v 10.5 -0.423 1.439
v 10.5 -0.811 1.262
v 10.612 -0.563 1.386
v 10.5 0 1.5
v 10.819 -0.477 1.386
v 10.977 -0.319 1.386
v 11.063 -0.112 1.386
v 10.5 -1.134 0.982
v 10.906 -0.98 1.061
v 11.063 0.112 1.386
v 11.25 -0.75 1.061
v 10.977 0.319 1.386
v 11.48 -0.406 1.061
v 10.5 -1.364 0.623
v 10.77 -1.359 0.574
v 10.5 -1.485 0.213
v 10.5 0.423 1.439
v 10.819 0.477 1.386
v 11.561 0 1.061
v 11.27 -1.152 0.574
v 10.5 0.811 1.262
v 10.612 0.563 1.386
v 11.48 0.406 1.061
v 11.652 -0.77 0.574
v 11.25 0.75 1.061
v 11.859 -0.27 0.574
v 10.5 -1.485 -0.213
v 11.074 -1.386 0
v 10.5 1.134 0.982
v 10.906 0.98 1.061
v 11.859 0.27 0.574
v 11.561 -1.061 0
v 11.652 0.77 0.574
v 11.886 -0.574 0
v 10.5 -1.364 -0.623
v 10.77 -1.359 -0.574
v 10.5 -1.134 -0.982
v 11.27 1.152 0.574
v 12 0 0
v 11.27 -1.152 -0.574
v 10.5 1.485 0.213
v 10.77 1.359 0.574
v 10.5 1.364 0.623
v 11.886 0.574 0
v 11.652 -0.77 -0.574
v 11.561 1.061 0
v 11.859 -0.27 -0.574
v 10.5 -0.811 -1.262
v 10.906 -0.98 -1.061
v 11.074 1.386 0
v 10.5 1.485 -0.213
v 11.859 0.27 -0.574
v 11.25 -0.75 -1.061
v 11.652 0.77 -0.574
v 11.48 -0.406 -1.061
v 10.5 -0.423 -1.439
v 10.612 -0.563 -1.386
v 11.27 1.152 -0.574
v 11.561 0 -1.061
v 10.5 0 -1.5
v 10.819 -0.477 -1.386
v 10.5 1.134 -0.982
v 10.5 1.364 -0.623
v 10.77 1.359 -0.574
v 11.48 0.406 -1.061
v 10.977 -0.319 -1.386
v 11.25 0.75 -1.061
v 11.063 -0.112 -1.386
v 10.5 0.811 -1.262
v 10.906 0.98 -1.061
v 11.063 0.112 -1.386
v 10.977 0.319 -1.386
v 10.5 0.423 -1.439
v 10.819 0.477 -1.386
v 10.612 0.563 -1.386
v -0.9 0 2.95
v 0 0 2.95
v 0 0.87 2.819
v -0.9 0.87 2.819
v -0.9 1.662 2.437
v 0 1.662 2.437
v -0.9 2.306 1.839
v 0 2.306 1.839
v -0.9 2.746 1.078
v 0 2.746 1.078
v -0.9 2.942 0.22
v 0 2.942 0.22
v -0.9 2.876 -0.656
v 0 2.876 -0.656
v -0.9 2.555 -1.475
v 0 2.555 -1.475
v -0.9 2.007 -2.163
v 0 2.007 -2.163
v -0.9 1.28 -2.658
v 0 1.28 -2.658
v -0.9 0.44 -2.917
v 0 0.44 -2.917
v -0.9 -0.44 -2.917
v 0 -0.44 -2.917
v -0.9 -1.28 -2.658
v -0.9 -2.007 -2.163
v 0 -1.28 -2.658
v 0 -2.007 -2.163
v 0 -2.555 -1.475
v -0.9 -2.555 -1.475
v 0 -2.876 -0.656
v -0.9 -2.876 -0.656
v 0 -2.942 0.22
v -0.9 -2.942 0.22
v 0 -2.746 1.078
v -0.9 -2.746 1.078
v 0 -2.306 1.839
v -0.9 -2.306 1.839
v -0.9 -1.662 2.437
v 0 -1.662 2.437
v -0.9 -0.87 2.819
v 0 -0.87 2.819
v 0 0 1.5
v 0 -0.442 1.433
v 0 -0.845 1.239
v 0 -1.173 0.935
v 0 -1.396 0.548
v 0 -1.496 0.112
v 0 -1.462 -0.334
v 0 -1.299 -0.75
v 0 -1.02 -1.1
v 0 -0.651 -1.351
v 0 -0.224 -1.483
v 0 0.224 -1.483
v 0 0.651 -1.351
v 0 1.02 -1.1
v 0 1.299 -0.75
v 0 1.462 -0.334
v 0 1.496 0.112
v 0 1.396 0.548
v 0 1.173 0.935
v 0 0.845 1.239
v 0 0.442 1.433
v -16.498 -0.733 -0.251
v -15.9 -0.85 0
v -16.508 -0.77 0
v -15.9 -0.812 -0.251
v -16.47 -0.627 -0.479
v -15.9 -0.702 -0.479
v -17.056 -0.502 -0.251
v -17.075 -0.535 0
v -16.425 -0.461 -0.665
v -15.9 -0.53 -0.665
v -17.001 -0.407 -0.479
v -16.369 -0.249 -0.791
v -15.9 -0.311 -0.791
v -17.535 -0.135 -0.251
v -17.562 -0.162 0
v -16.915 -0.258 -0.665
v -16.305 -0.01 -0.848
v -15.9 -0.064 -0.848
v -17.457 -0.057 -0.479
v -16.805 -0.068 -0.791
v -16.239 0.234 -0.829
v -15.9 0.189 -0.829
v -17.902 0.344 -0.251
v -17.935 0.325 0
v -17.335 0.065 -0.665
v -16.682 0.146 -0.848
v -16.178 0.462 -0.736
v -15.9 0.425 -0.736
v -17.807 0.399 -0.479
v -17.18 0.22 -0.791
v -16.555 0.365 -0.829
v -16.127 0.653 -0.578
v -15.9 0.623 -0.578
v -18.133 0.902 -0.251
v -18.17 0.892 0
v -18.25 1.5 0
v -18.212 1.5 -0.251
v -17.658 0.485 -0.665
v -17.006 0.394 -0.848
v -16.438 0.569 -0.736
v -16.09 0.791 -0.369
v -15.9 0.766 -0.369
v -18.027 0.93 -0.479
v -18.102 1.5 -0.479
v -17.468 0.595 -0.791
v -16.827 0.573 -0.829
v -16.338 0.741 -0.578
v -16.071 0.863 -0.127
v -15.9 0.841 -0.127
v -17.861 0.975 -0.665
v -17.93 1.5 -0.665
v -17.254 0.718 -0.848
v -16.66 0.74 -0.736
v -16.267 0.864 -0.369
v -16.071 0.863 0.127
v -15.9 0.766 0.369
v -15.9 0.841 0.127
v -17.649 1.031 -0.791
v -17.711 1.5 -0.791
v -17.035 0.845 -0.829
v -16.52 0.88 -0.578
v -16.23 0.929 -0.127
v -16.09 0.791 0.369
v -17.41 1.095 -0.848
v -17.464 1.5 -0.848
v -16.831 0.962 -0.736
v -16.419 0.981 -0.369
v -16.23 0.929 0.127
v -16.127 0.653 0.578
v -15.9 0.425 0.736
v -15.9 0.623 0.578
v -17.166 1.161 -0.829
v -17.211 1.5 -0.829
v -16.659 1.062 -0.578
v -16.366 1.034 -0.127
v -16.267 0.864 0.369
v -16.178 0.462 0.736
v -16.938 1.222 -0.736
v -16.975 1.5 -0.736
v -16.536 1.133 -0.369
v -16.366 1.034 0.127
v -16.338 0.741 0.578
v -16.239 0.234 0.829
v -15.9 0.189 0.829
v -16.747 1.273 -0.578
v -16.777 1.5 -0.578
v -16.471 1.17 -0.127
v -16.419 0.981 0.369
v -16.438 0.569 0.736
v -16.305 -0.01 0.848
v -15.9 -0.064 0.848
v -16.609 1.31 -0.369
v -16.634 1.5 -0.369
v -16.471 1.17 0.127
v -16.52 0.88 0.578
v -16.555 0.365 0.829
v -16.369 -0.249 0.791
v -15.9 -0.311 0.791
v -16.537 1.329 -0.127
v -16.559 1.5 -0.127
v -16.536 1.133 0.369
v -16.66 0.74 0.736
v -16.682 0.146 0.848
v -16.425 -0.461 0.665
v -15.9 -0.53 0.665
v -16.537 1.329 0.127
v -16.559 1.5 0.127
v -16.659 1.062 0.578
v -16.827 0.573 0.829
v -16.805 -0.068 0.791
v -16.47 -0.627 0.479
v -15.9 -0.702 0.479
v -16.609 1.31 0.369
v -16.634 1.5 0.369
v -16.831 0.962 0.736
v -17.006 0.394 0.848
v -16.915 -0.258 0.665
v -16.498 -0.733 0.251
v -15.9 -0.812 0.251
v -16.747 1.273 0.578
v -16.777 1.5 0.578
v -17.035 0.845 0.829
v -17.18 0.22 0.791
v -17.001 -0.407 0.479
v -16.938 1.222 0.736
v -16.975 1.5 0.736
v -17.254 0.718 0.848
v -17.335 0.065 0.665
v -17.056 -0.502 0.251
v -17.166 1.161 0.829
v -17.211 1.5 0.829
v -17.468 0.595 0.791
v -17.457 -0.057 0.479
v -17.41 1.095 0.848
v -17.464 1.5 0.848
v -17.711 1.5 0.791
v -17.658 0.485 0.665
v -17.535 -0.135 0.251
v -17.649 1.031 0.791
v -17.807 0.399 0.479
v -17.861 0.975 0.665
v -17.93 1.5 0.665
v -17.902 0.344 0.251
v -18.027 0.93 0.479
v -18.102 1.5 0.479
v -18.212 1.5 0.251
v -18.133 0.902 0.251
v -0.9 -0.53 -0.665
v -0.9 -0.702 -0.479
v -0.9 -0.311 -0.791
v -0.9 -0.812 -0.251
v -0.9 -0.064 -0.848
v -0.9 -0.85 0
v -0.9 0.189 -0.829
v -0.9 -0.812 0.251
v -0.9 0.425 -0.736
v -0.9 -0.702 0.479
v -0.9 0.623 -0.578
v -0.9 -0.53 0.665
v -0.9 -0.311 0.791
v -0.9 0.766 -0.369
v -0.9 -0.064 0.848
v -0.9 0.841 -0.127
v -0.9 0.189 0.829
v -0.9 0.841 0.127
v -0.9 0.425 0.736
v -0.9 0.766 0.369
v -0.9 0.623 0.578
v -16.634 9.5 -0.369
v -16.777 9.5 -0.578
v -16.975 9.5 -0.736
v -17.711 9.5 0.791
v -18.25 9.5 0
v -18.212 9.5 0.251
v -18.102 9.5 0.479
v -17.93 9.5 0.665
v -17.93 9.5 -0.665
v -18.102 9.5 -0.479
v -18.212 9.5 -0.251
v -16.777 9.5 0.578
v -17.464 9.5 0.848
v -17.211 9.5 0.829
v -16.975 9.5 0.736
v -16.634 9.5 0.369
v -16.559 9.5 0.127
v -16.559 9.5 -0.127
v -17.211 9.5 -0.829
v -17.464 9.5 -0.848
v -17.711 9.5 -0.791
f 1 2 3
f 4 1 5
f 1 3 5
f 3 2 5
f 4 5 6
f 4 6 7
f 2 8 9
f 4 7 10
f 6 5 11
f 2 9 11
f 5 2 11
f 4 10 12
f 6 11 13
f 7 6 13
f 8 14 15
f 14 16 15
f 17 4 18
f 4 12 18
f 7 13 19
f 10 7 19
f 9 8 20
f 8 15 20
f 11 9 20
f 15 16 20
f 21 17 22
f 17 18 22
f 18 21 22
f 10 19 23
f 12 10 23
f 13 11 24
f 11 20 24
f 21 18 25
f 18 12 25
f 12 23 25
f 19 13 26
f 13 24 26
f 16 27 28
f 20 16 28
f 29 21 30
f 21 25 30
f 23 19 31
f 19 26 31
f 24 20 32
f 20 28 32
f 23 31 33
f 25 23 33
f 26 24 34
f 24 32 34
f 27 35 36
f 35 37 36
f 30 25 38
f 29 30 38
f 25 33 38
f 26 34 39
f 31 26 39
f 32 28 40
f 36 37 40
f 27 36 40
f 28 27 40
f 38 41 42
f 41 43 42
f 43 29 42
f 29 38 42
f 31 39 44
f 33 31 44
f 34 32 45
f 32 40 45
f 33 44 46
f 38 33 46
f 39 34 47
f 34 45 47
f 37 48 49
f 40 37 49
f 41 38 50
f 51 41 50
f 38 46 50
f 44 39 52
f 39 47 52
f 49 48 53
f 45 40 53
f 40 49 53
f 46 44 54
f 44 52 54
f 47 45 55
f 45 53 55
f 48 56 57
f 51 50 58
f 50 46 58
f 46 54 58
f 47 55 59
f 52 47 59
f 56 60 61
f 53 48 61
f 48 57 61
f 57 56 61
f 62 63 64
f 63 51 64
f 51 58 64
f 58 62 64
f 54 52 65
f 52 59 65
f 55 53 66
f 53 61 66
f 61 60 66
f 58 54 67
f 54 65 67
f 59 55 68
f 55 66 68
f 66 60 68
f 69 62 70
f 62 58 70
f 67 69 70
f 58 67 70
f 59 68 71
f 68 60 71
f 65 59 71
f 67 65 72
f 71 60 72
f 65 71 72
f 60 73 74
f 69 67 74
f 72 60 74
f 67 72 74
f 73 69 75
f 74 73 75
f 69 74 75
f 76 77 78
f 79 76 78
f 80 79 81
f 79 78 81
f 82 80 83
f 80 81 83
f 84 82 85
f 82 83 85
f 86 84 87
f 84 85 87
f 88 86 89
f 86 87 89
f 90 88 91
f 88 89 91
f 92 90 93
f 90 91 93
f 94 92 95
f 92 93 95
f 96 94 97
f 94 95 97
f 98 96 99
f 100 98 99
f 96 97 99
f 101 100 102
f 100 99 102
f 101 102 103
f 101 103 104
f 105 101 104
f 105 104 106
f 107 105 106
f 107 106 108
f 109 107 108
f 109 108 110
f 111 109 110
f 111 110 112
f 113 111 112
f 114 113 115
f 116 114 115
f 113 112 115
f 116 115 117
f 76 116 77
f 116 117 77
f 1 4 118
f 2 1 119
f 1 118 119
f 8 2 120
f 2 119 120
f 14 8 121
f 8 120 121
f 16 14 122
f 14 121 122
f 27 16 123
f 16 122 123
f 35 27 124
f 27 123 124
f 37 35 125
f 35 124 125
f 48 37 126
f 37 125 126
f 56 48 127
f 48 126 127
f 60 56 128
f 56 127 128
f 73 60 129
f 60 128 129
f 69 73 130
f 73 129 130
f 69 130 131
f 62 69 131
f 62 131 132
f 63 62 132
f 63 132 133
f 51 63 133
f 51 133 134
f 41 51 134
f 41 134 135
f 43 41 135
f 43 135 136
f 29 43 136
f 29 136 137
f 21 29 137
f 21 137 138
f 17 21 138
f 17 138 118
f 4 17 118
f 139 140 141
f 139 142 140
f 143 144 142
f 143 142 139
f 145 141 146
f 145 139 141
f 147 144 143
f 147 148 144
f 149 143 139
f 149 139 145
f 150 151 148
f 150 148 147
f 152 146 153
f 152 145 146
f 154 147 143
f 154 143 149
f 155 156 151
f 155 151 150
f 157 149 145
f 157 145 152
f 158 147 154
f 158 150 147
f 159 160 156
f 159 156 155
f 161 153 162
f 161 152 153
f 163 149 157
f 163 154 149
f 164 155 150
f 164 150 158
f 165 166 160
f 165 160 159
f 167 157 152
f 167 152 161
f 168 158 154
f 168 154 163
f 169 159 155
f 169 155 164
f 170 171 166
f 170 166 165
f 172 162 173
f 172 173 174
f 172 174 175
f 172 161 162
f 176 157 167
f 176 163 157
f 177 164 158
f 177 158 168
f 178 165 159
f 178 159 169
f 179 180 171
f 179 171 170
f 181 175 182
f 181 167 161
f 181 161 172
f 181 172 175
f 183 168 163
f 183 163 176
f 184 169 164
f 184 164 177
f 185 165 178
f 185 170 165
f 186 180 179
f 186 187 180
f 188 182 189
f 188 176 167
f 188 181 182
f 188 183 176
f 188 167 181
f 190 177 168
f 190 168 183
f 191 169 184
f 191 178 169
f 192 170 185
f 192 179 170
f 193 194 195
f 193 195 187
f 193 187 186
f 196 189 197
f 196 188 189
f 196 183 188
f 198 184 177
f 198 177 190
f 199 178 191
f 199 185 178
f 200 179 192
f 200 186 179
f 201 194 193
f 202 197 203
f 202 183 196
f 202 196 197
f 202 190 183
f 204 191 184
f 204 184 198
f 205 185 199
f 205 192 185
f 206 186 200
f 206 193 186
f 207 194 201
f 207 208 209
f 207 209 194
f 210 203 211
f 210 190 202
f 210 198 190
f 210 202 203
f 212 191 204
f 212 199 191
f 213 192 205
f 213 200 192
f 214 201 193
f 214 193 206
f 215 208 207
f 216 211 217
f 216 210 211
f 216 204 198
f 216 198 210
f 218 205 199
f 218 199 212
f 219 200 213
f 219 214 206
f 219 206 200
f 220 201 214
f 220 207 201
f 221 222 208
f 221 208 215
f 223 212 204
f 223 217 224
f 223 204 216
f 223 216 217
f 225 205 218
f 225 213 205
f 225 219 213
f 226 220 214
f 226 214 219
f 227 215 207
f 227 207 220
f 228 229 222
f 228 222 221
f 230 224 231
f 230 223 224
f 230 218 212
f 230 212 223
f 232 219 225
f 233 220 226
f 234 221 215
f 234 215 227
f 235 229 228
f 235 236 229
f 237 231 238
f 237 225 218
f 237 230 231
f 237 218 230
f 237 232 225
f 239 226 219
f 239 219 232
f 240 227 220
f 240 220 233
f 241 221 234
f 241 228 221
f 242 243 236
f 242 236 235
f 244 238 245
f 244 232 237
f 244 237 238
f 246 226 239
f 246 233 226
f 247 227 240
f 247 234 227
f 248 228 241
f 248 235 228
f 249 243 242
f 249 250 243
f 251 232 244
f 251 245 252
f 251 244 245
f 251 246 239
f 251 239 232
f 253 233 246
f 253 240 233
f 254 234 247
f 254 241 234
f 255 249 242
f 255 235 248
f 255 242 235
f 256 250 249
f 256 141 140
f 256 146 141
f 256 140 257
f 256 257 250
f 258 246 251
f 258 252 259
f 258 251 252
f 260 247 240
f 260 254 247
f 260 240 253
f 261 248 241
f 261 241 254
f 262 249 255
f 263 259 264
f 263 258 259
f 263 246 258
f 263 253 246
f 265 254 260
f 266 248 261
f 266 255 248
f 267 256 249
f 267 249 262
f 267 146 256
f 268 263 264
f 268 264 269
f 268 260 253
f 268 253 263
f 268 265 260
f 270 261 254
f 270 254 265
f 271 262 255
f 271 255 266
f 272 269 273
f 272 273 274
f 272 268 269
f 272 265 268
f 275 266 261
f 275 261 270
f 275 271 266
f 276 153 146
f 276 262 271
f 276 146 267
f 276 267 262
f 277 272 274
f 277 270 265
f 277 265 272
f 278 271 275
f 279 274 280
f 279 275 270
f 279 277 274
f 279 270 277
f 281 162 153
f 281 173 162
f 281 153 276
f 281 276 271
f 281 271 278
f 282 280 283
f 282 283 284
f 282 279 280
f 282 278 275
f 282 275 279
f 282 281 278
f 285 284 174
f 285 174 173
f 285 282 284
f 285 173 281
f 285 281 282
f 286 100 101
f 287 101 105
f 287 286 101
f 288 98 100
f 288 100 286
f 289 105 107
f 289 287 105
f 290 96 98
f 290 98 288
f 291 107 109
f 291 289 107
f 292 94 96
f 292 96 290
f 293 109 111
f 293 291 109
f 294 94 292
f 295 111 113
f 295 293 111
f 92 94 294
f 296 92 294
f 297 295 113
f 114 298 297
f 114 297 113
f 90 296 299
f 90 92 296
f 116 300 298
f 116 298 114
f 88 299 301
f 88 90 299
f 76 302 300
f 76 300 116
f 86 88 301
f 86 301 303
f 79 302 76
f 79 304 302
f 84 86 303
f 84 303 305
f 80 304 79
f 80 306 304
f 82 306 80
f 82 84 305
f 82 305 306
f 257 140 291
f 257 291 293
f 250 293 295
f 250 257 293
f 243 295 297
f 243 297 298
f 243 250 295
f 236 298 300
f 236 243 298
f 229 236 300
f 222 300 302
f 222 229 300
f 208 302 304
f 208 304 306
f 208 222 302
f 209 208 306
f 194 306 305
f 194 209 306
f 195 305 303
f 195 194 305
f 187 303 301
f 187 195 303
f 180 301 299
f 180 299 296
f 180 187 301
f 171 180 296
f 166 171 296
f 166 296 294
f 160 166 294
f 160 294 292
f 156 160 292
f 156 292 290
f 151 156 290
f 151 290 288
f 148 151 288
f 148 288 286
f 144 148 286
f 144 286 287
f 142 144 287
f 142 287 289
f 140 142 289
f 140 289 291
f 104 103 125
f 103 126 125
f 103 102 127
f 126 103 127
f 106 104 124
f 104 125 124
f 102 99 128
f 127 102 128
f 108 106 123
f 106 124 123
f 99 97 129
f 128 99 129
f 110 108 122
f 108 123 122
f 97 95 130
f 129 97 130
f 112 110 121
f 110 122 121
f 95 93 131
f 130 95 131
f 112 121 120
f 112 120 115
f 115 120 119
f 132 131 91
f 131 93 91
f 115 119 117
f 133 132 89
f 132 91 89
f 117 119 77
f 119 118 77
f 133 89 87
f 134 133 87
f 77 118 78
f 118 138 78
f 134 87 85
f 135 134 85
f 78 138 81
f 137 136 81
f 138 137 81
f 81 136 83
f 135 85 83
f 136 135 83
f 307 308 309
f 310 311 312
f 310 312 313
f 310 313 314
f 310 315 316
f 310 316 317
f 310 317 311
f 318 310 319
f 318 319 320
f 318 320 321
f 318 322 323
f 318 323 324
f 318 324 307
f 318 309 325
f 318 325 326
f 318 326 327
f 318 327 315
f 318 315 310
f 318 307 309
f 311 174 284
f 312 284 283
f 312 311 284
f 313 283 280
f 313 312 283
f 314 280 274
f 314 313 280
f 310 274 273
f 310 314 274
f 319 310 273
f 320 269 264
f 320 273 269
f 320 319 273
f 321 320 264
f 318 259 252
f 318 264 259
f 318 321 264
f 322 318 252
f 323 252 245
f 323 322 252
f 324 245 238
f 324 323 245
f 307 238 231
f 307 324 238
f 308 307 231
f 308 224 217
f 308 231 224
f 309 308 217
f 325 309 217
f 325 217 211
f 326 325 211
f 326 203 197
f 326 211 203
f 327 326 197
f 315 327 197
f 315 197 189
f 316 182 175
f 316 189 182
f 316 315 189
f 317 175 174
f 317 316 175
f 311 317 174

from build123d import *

# Parameters (mm, degrees)
SKETCH1_R           = 1.5
BOSS_EXTRUDE1_DEPTH = 10.5
SKETCH2_R           = 2.95
BOSS_EXTRUDE2_DEPTH = 0.9
SWEEP1_PROFILE_R    = 0.85


with BuildPart() as part:
    # Sketch1 → Boss-Extrude1 (new body)
    with BuildSketch(Plane(origin=(0, 0, 0), x_dir=(0, 0, -1), z_dir=(1, 0, 0))):
        with Locations(Location((0, 0, 0), (0, 0, 180))):
            Circle(SKETCH1_R)
    extrude(amount=BOSS_EXTRUDE1_DEPTH)

    # Sketch8 → Revolve1 (revolve)
    with BuildSketch(Plane(origin=(10.5, 0, 0), x_dir=(0, 0, -1), z_dir=(1, 0, 0))):
        with BuildLine():
            Line((1.5, 0), (-1.5, 0))
            ThreePointArc((-1.5, 0), (0, 1.5), (1.5, 0))
        make_face()
    revolve(axis=Axis((10.5, 0, -1.5), (0, 0, 1)))

    # Sketch2 → Boss-Extrude2 (add)
    with BuildSketch(Plane.ZY):
        Circle(SKETCH2_R)
    extrude(amount=BOSS_EXTRUDE2_DEPTH)

    # Sweep1: sweep along a path in Sketch3
    with BuildLine(Plane.XY) as sweep1_path:
        Line((-0.9, 0), (-15.9, 0))
        ThreePointArc((-15.9, 0), (-16.960660172, 0.439339828), (-17.4, 1.5))
        Line((-17.4, 1.5), (-17.4, 9.5))
    # Sweep1 profile (on start of the path) → Sweep1 (sweep)
    with BuildSketch(Plane(origin=(-0.9, 0, 0), x_dir=(0, -1, 0), z_dir=(-1, 0, 0))):
        Circle(SWEEP1_PROFILE_R)
    sweep(path=sweep1_path.line)


solid = part.part
